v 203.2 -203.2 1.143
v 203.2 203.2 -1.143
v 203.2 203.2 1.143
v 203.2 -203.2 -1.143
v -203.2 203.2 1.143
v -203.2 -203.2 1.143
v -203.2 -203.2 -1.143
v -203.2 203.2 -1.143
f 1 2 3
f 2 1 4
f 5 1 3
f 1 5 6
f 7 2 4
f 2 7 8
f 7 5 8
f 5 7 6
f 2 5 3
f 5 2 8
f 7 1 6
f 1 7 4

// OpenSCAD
module example003()
{
	difference() {
		union() {
			cube([406.4, 406.4, 2.286], center = true);
		}
		union() {
			
		}
	}
}

example003();
